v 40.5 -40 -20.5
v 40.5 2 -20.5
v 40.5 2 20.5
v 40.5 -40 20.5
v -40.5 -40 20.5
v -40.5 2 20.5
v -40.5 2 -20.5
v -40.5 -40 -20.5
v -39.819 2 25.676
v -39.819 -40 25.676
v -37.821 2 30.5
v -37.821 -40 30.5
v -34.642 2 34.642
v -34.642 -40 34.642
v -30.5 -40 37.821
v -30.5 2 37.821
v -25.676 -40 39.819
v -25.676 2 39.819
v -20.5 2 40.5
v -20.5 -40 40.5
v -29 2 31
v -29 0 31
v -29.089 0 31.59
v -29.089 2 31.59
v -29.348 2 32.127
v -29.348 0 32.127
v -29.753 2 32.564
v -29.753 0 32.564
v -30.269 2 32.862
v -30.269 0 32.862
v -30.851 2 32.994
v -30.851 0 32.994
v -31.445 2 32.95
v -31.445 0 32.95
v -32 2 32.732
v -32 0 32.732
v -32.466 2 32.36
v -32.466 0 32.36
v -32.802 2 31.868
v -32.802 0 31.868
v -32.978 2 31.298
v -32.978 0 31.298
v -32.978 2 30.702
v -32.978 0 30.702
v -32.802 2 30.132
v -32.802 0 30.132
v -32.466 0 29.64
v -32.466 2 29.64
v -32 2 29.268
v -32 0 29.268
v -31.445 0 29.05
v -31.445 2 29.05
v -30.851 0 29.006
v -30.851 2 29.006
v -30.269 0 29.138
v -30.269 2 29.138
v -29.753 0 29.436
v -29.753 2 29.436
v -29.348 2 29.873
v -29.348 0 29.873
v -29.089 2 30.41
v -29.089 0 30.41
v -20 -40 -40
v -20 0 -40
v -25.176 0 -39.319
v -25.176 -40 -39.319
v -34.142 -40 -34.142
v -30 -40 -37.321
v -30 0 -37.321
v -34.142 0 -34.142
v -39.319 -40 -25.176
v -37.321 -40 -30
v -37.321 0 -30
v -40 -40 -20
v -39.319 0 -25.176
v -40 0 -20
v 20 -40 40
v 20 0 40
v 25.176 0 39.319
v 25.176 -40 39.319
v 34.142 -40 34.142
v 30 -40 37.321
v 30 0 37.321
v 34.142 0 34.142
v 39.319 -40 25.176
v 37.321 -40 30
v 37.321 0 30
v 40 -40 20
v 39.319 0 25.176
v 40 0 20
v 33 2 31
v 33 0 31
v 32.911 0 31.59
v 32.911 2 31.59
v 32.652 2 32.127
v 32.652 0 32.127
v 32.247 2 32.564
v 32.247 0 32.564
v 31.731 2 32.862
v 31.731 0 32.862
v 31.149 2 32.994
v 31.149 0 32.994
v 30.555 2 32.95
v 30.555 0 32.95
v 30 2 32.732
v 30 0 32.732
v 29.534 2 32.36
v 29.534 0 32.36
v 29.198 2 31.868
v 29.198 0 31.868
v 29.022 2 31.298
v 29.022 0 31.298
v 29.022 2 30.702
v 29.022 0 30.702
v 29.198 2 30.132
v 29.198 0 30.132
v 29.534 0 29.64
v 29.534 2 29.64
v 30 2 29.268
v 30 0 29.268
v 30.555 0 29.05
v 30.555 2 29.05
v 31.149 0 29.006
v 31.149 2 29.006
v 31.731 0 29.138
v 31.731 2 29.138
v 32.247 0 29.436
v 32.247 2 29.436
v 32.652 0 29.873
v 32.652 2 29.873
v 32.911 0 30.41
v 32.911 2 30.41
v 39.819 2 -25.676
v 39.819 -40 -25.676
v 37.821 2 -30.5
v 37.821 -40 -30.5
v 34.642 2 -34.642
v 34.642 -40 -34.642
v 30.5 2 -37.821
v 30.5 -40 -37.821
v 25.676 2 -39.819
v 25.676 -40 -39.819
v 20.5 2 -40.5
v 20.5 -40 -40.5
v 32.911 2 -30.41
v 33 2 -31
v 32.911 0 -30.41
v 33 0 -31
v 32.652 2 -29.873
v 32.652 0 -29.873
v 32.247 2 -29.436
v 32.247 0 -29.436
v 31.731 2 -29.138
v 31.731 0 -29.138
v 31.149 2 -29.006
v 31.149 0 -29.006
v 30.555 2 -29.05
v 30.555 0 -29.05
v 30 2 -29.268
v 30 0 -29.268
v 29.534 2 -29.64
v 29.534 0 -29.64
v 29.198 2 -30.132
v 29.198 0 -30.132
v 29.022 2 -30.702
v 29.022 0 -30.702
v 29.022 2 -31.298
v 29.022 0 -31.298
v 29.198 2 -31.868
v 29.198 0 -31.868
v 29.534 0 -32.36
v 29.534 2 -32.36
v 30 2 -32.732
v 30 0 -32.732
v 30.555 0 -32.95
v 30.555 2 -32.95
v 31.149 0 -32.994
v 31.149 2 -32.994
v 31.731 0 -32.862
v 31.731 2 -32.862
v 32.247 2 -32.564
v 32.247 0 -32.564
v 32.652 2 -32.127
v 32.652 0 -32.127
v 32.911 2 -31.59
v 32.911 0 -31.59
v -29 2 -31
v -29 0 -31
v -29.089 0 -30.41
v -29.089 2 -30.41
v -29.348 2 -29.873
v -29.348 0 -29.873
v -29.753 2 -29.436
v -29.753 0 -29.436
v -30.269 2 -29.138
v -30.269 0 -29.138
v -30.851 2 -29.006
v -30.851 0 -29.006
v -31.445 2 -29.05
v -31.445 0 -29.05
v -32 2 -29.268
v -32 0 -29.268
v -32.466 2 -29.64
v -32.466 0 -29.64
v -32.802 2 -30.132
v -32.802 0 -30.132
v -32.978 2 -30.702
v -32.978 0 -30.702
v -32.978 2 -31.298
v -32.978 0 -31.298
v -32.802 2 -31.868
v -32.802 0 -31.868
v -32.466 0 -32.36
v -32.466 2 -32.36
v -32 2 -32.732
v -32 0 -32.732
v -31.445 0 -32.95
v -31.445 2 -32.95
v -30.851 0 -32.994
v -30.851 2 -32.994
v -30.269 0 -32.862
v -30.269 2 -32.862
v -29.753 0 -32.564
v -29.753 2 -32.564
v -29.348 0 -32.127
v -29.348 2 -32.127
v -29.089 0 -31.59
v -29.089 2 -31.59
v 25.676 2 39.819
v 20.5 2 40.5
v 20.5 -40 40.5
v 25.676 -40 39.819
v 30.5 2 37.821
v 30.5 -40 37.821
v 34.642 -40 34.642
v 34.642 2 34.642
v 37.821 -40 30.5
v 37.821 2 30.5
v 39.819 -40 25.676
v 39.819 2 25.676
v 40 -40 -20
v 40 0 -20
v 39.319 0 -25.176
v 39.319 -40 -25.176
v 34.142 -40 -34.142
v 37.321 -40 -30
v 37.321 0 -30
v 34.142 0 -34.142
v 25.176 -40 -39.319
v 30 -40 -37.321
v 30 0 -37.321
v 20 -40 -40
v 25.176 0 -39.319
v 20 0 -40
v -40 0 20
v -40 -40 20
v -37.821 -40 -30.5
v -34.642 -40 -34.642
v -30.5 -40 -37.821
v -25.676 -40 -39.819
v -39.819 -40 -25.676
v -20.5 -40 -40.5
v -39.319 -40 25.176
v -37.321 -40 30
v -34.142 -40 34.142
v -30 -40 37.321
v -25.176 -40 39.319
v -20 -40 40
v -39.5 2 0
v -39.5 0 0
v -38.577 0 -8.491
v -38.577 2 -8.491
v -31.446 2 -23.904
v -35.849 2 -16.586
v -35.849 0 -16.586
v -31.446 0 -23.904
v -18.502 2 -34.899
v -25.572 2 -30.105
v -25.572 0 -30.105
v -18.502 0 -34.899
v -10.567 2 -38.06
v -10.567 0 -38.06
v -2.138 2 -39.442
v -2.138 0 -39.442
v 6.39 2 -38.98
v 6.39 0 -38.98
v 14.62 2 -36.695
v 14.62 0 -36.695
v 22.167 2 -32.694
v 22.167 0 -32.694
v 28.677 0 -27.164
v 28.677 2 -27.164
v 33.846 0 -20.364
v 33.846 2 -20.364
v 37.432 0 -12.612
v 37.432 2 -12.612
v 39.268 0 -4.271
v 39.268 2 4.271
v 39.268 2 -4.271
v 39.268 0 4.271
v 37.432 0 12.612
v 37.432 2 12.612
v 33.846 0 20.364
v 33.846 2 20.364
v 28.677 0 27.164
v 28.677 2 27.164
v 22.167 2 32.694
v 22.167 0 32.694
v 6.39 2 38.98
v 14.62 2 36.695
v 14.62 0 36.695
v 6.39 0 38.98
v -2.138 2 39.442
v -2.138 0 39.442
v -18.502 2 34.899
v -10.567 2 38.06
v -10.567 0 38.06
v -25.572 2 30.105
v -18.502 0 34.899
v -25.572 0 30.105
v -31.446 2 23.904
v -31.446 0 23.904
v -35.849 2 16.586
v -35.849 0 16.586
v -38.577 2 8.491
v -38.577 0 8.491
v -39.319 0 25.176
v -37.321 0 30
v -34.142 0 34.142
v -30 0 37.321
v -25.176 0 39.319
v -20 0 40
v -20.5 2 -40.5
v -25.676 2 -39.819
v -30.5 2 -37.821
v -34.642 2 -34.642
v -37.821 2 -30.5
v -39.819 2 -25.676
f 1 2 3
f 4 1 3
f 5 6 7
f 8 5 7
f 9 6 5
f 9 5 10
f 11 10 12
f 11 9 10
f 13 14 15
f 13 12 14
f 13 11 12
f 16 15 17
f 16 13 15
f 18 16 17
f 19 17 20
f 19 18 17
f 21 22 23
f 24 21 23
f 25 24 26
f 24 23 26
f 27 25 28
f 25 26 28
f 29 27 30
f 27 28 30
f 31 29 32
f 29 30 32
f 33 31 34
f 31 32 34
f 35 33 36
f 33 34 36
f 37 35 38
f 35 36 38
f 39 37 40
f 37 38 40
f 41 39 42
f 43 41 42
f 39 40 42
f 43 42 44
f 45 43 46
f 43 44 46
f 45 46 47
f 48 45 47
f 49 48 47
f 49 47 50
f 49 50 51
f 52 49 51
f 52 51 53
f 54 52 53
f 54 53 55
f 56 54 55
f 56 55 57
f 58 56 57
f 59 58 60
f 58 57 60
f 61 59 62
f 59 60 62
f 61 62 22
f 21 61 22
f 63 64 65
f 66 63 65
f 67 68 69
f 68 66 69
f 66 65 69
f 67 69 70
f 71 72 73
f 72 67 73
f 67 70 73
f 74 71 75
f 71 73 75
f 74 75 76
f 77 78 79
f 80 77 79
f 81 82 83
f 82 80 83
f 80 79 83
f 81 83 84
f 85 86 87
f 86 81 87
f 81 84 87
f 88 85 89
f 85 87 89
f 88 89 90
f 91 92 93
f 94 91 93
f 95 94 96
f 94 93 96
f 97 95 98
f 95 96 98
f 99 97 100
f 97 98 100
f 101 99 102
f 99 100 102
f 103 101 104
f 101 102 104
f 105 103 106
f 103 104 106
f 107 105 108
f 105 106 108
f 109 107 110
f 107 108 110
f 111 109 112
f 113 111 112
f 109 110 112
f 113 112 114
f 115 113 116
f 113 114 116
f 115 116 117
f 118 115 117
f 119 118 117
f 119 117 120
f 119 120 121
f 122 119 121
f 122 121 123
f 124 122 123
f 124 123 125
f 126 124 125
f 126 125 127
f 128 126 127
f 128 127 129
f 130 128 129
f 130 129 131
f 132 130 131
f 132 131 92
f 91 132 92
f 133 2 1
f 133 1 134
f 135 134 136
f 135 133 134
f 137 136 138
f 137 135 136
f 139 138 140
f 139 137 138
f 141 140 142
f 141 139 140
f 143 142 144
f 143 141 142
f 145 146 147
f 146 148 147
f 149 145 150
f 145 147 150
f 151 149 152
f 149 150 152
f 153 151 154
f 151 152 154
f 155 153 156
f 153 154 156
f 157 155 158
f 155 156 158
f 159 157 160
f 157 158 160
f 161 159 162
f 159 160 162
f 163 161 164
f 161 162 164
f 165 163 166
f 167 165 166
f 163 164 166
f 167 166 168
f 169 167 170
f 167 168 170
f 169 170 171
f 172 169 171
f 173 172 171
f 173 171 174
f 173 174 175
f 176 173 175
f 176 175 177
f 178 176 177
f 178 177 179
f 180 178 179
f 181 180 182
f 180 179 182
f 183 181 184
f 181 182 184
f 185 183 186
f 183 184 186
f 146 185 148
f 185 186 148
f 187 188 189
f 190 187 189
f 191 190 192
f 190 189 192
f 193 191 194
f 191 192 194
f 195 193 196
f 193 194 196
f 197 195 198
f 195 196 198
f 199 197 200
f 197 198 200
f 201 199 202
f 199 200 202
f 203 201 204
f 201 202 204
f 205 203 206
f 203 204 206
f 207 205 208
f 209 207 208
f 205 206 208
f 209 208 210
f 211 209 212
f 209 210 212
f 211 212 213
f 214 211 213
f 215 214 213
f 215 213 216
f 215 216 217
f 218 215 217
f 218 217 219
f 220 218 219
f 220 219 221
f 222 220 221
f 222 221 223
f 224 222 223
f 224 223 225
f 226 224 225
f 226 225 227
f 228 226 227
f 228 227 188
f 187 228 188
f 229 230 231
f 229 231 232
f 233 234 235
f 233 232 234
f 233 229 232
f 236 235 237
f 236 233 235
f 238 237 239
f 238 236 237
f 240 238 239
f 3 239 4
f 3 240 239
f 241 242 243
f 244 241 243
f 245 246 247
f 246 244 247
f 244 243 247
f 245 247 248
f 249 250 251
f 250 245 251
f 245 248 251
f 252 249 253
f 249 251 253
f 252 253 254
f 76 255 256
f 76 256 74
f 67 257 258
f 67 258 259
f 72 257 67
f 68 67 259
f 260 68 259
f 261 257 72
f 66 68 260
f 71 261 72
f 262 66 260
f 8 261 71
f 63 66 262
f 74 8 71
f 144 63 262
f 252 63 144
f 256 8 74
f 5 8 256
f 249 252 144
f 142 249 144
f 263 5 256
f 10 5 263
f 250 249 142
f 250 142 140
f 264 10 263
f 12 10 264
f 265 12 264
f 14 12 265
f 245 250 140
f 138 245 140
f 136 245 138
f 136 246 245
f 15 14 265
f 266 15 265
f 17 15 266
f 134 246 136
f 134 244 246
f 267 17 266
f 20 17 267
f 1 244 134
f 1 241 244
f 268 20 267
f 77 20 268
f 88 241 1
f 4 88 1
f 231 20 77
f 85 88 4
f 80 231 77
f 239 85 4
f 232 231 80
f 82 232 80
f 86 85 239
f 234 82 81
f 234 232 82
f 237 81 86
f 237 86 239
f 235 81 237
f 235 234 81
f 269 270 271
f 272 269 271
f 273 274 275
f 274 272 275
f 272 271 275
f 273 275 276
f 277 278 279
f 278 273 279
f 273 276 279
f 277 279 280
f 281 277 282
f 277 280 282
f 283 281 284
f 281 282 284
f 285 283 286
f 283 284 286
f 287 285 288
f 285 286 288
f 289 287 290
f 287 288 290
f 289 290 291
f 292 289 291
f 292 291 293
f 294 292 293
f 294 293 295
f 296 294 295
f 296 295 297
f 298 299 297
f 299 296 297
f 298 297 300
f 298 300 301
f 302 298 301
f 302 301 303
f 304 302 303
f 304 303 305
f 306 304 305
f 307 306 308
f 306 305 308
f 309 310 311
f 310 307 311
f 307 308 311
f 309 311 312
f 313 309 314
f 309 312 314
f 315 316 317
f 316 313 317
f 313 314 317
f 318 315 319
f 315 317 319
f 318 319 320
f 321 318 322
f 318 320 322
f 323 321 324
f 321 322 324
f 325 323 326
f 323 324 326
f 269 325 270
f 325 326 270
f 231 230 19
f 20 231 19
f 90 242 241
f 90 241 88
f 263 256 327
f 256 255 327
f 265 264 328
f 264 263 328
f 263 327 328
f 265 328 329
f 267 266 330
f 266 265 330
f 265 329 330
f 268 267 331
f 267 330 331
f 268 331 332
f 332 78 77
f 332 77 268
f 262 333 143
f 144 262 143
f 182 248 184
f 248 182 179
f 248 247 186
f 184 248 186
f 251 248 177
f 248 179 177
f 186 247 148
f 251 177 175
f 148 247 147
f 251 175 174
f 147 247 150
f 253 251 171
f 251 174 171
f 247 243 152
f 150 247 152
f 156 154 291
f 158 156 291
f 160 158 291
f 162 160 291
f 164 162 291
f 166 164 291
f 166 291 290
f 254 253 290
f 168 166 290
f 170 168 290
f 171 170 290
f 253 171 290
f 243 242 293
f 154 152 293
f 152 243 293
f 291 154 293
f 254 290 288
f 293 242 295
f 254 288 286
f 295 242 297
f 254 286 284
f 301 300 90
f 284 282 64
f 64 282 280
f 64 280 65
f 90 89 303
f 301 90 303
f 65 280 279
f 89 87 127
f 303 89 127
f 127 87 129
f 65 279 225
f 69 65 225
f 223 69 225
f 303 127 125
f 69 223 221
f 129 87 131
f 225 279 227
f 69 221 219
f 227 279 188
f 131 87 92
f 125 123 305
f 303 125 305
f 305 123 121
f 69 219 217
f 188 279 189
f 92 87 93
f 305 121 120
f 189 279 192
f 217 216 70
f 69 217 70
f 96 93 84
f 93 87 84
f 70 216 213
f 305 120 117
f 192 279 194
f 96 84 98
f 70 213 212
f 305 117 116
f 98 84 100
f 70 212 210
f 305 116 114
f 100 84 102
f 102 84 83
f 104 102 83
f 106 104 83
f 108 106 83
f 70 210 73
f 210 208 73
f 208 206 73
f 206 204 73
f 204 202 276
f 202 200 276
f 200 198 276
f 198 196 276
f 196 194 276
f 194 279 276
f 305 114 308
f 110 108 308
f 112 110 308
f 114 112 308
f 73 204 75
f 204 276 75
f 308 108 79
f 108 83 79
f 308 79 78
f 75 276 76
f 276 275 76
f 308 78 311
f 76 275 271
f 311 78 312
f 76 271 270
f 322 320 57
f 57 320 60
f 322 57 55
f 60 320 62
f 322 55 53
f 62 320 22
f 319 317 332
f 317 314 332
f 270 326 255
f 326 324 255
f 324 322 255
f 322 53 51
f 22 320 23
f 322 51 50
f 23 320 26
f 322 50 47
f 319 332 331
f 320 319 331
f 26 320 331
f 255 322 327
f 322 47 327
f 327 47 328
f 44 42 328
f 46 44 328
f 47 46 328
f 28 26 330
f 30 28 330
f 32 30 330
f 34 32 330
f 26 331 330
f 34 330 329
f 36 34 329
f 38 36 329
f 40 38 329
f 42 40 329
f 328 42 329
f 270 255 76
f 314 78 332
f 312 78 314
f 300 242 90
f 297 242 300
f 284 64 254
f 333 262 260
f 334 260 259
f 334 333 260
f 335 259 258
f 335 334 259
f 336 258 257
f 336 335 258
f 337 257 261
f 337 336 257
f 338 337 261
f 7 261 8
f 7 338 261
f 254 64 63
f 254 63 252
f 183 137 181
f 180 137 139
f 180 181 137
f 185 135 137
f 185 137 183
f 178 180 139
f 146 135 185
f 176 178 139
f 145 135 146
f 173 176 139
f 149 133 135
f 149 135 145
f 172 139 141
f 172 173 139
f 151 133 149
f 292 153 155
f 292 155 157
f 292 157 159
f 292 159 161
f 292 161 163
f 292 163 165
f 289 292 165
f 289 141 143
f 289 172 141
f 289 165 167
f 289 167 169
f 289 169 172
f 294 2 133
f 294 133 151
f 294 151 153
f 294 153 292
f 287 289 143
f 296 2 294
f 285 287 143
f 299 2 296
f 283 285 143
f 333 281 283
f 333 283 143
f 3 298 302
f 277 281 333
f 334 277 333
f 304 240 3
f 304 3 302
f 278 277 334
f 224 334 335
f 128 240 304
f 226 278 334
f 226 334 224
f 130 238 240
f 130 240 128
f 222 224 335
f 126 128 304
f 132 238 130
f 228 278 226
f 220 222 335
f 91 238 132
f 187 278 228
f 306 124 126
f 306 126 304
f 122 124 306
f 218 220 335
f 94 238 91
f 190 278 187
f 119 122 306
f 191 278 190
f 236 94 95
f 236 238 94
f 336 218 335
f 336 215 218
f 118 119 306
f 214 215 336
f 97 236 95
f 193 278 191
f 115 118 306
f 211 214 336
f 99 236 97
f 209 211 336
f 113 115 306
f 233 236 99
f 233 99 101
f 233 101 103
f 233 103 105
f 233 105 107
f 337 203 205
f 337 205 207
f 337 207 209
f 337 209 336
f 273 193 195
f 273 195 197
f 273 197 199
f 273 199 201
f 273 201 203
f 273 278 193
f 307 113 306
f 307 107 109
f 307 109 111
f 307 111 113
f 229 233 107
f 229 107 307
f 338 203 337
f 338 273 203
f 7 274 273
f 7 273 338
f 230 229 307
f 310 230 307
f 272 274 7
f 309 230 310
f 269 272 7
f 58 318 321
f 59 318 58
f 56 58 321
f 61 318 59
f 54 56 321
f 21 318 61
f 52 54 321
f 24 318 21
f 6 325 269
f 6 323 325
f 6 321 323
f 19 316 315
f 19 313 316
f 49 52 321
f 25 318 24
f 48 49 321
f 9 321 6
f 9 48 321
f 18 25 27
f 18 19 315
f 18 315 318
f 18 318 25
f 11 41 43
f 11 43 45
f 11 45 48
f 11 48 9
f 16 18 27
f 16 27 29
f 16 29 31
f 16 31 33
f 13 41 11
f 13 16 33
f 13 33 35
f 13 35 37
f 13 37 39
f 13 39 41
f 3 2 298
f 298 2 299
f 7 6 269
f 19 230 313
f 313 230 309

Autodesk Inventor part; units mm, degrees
ref_plane "YZ Plane" through (0, 0, 0) normal (1, 0, 0) x (0, 1, 0)
ref_plane "XZ Plane" through (0, 0, 0) normal (0, 1, 0) x (-1, 0, 0)
ref_plane "XY Plane" through (0, 0, 0) normal (0, 0, 1) x (1, 0, 0)
sketch "Sketch1" plane through (0, 0, 0) normal (0, 1, 0) x (-1, 0, 0)
  circle A0 centre (0, 0) radius 39.5
  circle A1 centre (0, 0) radius 40.5
  dimension "d0" = 79
  dimension "d1" = 81
extrude "Extrusion1" add sketch "Sketch1" along normal blind 2
sketch "Sketch21" plane through (0, 2, 0) normal (0, 1, 0) x (1, 0, 0)
  line L0 (-40.5, -40.5) -> (40.5, -40.5)
  line L1 (40.5, -40.5) -> (40.5, 40.5)
  line L2 (40.5, 40.5) -> (-40.5, 40.5)
  line L3 (-40.5, 40.5) -> (-40.5, -40.5)
  line L4 (-40.5, -40.5) -> (40.5, 40.5) construction
  line L5 (40.5, -40.5) -> (-40.5, 40.5) construction
  circle A0 centre (0, 0) radius 40.5
  dimension "d111" = 81
  dimension "d112" = 81
extrude "Extrusion21" add sketch "Sketch21" against normal blind 2 contours L3 A0 L0 | A0 L1 L0 | L3 L2 A0 | A0 L2 L1
fillet "Fillet3" radius 20 4 edges at (-40.5, 1, -40.5) (40.5, 1, -40.5) (40.5, 1, 40.5) (-40.5, 1, 40.5)
sketch "Sketch24" plane through (0, 0, 0) normal (0, -1, 0) x (1, 0, 0)
  arc A0 (-20.5, 40.5) -> (-40.5, 20.5) centre (-20.5, 20.5) ccw projected
  circle A1 centre (0, 0) radius 39.5 projected
  arc A2 (-20.5, 40.5) -> (-40.5, 20.5) centre (-20.5, 20.5) ccw projected
  line L0 (-40.5, 20.5) -> (-40.5, -20.5) projected
  arc A3 (-40.5, -20.5) -> (-20.5, -40.5) centre (-20.5, -20.5) ccw projected
  line L1 (-20.5, -40.5) -> (20.5, -40.5) projected
  arc A4 (20.5, -40.5) -> (40.5, -20.5) centre (20.5, -20.5) ccw projected
  line L2 (40.5, -20.5) -> (40.5, 20.5) projected
  arc A5 (40.5, 20.5) -> (20.5, 40.5) centre (20.5, 20.5) ccw projected
  line L3 (20.5, 40.5) -> (-20.5, 40.5) projected
  line L4 (-20, -40) -> (20, -40)
  line L5 (40, -20) -> (40, 20)
  line L6 (20, 40) -> (-20, 40)
  line L7 (-40, 20) -> (-40, -20)
  line L8 (-40, -40) -> (40, 40) construction
  line L9 (40, -40) -> (-40, 40) construction
  arc A6 (-38, 40) -> (-40, 38) centre (-38, 38) ccw
  arc A7 (40, 20) -> (20, 40) centre (20, 20) ccw
  arc A8 (-20, 40) -> (-40, 20) centre (-20, 20) ccw
  arc A9 (-40, -20) -> (-20, -40) centre (-20, -20) ccw
  arc A10 (20, -40) -> (40, -20) centre (20, -20) ccw
  dimension "d133" = 80
  dimension "d134" = 80
  dimension "d135" = 2
  dimension "d136" = 20
extrude "Extrusion24" add sketch "Sketch24" along normal blind 40 contours L3 A5 L2 A4 L1 A3 L0 A0
sketch "Sketch25" plane through (0, 0, 0) normal (0, -1, 0) x (1, 0, 0)
  circle A0 centre (-31, -31) radius 2
  line L0 (0, 0) -> (-40.0942, -40.0942)
  line L1 (0, 0) -> (0, -34.7078)
  circle A1 centre (31, -31) radius 2
  circle A2 centre (31, 31) radius 2
  circle A3 centre (-31, 31) radius 2
  dimension "d139" = 4
  dimension "d140" = 31
  dimension "d141" = 45
  dimension "d144" = 360
extrude "Extrusion25" cut sketch "Sketch25" against normal blind 10
properties part number "Motor mount (plain)"
